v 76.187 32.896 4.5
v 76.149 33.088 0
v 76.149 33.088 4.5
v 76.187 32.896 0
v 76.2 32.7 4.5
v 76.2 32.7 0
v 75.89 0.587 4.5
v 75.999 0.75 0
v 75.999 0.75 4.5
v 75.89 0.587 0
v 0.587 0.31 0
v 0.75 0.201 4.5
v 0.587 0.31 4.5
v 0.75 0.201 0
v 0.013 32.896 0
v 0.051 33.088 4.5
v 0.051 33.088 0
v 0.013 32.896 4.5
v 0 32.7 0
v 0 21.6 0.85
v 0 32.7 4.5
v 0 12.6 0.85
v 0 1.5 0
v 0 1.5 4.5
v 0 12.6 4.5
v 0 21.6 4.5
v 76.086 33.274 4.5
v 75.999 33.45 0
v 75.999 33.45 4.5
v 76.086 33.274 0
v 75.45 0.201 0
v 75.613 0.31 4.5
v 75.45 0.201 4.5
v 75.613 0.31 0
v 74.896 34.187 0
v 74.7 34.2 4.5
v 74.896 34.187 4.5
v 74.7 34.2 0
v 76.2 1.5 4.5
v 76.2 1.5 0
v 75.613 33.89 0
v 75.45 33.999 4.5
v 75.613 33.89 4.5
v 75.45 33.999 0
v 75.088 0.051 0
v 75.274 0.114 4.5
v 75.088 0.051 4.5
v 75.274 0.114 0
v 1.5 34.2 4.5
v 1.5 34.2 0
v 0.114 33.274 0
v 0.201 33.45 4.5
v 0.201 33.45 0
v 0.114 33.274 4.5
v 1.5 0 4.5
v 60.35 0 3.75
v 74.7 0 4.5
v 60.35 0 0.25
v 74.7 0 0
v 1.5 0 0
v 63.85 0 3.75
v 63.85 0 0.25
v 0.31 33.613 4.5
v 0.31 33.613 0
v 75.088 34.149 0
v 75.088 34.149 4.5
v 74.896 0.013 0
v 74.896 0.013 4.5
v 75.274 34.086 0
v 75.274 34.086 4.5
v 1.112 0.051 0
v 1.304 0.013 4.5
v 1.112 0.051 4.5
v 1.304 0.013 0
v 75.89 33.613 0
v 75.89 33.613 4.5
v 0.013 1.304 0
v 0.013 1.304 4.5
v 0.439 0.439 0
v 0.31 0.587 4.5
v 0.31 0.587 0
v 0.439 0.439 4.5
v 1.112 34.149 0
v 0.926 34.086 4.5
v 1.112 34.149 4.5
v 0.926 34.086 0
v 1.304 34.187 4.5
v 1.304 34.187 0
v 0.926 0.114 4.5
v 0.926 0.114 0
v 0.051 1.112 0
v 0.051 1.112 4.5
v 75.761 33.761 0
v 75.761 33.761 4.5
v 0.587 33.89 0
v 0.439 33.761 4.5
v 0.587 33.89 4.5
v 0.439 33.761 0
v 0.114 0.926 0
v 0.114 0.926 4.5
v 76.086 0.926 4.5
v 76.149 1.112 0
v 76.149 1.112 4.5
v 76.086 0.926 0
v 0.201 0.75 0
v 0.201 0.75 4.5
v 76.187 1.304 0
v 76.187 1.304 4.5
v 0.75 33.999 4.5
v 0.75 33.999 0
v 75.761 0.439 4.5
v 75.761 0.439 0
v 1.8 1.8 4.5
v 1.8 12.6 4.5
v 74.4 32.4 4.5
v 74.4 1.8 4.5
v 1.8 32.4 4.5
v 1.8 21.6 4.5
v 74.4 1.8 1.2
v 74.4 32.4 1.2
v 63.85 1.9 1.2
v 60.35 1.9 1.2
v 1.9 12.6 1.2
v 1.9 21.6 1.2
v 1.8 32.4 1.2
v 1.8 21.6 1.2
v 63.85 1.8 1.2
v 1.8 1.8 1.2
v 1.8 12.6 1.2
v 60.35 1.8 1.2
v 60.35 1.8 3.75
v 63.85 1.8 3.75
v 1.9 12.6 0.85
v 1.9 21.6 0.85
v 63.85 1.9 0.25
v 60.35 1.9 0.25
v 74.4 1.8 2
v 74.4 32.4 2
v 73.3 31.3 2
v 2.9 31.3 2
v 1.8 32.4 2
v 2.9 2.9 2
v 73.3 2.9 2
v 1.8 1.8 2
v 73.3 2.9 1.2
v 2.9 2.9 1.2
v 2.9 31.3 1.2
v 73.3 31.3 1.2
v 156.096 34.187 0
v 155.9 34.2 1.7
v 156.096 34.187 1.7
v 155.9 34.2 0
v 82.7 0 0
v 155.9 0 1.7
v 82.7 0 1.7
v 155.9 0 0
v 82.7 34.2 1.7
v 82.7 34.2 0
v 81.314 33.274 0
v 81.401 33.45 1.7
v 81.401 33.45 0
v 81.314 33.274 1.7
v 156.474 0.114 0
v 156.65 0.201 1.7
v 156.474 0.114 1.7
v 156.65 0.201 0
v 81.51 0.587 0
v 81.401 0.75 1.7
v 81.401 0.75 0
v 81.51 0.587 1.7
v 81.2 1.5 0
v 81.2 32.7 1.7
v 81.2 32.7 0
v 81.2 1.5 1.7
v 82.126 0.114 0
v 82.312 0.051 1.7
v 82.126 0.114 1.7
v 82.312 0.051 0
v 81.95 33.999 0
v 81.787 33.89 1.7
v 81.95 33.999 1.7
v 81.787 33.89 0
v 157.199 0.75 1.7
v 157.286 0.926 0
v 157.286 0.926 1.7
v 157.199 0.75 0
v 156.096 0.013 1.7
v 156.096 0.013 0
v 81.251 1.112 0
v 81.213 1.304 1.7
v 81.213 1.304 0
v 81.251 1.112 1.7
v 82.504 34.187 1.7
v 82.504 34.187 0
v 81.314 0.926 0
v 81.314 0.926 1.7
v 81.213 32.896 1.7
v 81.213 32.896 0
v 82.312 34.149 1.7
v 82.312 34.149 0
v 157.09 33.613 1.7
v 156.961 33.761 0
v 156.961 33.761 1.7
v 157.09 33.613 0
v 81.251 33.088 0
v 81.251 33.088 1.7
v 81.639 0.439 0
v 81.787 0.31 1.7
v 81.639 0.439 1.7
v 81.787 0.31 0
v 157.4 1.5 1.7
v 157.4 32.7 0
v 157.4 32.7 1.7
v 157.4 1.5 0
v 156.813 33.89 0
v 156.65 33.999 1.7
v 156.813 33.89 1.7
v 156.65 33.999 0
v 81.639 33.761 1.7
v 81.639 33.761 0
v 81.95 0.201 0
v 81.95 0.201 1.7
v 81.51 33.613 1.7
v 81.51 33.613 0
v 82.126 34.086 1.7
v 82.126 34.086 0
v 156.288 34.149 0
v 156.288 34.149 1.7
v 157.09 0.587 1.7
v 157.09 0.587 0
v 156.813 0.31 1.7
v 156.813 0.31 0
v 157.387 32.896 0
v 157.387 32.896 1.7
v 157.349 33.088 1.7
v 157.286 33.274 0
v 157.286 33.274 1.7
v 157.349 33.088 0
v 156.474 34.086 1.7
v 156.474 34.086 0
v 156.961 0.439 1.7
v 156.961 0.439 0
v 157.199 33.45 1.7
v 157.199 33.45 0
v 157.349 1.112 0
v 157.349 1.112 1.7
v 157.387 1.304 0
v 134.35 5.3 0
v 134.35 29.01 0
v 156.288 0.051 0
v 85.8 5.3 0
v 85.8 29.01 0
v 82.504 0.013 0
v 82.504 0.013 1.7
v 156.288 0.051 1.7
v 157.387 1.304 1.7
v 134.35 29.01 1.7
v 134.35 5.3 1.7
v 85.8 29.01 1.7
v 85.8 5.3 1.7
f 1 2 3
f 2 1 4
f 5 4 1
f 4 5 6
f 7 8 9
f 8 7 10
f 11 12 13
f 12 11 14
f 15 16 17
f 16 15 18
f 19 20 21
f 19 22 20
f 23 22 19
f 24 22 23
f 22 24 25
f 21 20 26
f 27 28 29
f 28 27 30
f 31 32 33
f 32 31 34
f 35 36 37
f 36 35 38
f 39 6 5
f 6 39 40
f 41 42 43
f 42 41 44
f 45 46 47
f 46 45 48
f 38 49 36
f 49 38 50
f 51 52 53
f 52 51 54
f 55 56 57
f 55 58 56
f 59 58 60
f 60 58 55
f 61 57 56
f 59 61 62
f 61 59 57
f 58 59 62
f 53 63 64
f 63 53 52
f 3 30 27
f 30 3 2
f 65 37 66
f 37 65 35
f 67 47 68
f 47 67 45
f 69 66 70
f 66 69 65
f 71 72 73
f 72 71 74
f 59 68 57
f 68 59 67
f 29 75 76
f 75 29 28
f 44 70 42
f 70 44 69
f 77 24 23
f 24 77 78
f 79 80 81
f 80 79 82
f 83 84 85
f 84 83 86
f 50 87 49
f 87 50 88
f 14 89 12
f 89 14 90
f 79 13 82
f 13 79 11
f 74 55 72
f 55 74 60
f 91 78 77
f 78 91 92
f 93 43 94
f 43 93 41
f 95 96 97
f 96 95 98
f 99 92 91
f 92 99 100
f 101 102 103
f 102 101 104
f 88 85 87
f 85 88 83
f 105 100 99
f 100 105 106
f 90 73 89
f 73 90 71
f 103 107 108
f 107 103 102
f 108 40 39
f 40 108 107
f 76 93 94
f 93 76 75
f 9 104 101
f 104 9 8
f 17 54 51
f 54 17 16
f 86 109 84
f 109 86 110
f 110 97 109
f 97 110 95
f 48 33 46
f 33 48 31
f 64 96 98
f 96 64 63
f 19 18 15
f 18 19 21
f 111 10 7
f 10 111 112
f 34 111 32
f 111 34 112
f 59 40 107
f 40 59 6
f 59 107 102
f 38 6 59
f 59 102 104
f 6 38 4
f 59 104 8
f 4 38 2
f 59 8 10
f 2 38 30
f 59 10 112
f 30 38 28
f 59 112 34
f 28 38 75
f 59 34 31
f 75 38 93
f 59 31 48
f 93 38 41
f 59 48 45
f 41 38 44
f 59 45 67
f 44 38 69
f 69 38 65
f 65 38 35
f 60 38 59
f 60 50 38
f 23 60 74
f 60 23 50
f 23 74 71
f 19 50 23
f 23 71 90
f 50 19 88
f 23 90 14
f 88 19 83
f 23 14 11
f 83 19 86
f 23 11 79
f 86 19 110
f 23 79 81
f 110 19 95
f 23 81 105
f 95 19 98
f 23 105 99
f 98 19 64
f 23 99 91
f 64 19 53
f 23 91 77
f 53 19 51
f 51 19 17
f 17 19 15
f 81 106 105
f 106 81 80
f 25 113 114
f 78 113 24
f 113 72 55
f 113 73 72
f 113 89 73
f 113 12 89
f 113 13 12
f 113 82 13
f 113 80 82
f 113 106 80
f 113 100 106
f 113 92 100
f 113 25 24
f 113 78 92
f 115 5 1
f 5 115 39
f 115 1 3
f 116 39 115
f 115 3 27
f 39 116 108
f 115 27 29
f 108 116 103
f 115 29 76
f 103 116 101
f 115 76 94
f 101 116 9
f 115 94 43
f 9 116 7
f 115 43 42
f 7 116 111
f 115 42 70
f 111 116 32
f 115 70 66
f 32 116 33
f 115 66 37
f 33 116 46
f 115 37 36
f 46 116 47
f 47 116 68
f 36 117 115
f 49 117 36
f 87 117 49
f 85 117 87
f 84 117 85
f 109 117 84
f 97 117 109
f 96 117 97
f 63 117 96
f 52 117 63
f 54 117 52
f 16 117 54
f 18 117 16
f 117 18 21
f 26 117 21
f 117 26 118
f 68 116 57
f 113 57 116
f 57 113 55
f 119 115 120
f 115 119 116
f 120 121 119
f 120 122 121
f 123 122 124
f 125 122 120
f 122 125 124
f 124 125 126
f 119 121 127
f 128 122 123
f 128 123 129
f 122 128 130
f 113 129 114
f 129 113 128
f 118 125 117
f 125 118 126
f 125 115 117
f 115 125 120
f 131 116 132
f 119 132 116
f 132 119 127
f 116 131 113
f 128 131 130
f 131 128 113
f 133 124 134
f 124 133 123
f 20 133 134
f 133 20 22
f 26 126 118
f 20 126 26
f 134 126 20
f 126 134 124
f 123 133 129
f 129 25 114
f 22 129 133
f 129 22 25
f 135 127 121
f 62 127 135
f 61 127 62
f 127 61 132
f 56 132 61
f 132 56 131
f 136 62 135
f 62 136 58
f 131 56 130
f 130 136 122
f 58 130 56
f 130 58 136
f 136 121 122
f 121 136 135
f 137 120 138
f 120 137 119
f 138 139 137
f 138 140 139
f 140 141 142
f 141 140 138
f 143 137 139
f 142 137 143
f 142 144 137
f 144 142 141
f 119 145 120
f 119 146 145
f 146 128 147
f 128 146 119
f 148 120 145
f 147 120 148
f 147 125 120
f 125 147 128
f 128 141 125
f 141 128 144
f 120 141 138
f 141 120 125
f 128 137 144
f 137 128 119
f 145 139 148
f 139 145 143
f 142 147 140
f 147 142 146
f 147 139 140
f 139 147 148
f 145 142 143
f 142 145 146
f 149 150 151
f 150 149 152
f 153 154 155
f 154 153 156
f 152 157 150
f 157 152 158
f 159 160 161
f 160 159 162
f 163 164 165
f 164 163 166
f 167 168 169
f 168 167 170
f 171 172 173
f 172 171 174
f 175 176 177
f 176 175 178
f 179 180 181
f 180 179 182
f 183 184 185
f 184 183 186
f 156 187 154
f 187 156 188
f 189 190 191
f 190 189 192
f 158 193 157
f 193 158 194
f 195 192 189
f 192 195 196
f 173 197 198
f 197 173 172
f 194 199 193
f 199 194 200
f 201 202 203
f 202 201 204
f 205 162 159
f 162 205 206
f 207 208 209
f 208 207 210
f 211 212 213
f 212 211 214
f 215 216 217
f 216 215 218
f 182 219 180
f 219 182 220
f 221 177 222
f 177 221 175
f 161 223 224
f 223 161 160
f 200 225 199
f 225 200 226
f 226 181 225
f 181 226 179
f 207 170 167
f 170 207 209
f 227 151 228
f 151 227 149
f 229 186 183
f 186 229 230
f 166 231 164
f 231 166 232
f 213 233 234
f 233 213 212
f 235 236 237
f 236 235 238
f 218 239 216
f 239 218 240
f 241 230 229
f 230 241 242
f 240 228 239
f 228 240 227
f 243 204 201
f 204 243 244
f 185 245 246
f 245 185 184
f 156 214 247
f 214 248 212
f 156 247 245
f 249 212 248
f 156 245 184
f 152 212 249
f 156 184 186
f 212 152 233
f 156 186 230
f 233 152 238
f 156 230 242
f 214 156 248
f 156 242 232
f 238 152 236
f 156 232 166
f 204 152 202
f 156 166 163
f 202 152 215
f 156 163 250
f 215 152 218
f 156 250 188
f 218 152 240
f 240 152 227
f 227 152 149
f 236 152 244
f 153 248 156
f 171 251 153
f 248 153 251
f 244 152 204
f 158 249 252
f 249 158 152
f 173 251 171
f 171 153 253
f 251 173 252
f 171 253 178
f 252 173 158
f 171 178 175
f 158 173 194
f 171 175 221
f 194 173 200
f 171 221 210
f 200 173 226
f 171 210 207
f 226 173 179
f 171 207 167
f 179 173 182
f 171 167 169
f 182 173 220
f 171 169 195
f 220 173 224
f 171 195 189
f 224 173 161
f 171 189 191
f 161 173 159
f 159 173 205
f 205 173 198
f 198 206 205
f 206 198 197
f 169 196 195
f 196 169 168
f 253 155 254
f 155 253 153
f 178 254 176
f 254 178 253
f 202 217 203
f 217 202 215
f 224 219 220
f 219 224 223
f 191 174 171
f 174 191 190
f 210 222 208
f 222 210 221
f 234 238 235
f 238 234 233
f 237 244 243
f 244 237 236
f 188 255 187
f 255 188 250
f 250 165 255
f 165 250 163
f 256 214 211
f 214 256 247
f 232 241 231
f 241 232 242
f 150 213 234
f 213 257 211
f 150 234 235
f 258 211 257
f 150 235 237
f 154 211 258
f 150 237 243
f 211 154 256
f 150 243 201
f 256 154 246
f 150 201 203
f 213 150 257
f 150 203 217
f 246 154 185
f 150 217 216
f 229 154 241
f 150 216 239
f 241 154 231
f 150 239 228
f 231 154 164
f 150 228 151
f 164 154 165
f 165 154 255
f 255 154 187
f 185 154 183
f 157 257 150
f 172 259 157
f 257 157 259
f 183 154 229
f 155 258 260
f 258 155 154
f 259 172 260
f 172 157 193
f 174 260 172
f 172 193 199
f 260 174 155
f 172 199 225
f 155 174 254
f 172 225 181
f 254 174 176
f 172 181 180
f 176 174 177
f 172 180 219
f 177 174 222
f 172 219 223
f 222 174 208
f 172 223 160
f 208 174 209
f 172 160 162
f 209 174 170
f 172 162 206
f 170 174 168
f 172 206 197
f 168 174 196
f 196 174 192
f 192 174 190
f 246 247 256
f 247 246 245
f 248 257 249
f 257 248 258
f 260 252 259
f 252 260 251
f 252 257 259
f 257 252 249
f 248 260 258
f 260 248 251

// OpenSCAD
// Heltec Wireless Paper case
// All dimensions in mm. Tune with calipers once device arrives.

// ── PCB ──────────────────────────────────────────────────────────────────────
pcb_l        = 72.0;   // PCB length (long axis)
pcb_w        = 30.0;   // PCB width
pcb_t        = 1.6;    // PCB thickness

// ── Display ───────────────────────────────────────────────────────────────────
disp_l       = 48.55;  // active area length
disp_w       = 23.71;  // active area width
disp_t       = 1.2;    // display module thickness above PCB
// display offset from PCB origin (measure from corner nearest USB end)
disp_x       = 2.5;    // from left (USB) edge of PCB
disp_y       = 3.2;    // from bottom edge of PCB

// ── Button ────────────────────────────────────────────────────────────────────
btn_dia      = 3.5;    // hole diameter
btn_x        = 60.0;   // from USB end along long axis
btn_y        = 0;      // on the bottom edge (y=0 side)

// ── USB-C port ────────────────────────────────────────────────────────────────
usb_w        = 9.0;    // cutout width
usb_h        = 4.0;    // cutout height
usb_y_center = 15.0;   // centre of USB from bottom edge of PCB

// ── Case walls ────────────────────────────────────────────────────────────────
wall         = 1.8;    // wall thickness
floor_t      = 1.2;    // bottom floor thickness
lid_t        = 1.2;    // lid thickness
clearance    = 0.3;    // PCB fit clearance on each side

// ── Snap fit ──────────────────────────────────────────────────────────────────
snap_h       = 2.0;
snap_d       = 0.6;

// ── Derived ───────────────────────────────────────────────────────────────────
inner_l = pcb_l + 2 * clearance;
inner_w = pcb_w + 2 * clearance;
inner_h = pcb_t + disp_t + 0.5;   // PCB + display stack + headroom
outer_l = inner_l + 2 * wall;
outer_w = inner_w + 2 * wall;
outer_h = floor_t + inner_h;

$fn = 48;

// ── BOTTOM SHELL ─────────────────────────────────────────────────────────────
module bottom_shell() {
    difference() {
        // outer box
        rounded_box(outer_l, outer_w, outer_h, r=1.5);

        // hollow interior
        translate([wall, wall, floor_t])
            cube([inner_l, inner_w, outer_h]);

        // USB-C cutout on left (x=0) face
        translate([-0.1,
                   wall + clearance + usb_y_center - usb_w / 2,
                   floor_t + (inner_h - usb_h) / 2])
            cube([wall + 0.2, usb_w, usb_h]);

        // Button access hole on front (y=0) face
        translate([wall + clearance + btn_x - btn_dia / 2,
                   -0.1,
                   floor_t + pcb_t / 2 - btn_dia / 2])
            cube([btn_dia, wall + 0.2, btn_dia]);
    }

    // PCB ledge — small lip to hold PCB off the floor for soldering clearance
    translate([wall, wall, floor_t])
        difference() {
            cube([inner_l, inner_w, 0.8]);
            translate([clearance + 0.8, clearance + 0.8, -0.1])
                cube([pcb_l - 1.6, pcb_w - 1.6, 1.0]);
        }
}

// ── LID ──────────────────────────────────────────────────────────────────────
module lid() {
    difference() {
        rounded_box(outer_l, outer_w, lid_t + 0.5, r=1.5);

        // display window
        translate([wall + clearance + disp_x,
                   wall + clearance + disp_y,
                   -0.1])
            cube([disp_l, disp_w, lid_t + 1]);
    }
}

// ── HELPER: rounded box ───────────────────────────────────────────────────────
module rounded_box(l, w, h, r=1) {
    hull() {
        for (x = [r, l - r])
            for (y = [r, w - r])
                translate([x, y, 0])
                    cylinder(r=r, h=h);
    }
}

// ── RENDER ────────────────────────────────────────────────────────────────────
// bottom shell at origin, lid beside it for printing
bottom_shell();

translate([outer_l + 5, 0, 0])
    lid();
